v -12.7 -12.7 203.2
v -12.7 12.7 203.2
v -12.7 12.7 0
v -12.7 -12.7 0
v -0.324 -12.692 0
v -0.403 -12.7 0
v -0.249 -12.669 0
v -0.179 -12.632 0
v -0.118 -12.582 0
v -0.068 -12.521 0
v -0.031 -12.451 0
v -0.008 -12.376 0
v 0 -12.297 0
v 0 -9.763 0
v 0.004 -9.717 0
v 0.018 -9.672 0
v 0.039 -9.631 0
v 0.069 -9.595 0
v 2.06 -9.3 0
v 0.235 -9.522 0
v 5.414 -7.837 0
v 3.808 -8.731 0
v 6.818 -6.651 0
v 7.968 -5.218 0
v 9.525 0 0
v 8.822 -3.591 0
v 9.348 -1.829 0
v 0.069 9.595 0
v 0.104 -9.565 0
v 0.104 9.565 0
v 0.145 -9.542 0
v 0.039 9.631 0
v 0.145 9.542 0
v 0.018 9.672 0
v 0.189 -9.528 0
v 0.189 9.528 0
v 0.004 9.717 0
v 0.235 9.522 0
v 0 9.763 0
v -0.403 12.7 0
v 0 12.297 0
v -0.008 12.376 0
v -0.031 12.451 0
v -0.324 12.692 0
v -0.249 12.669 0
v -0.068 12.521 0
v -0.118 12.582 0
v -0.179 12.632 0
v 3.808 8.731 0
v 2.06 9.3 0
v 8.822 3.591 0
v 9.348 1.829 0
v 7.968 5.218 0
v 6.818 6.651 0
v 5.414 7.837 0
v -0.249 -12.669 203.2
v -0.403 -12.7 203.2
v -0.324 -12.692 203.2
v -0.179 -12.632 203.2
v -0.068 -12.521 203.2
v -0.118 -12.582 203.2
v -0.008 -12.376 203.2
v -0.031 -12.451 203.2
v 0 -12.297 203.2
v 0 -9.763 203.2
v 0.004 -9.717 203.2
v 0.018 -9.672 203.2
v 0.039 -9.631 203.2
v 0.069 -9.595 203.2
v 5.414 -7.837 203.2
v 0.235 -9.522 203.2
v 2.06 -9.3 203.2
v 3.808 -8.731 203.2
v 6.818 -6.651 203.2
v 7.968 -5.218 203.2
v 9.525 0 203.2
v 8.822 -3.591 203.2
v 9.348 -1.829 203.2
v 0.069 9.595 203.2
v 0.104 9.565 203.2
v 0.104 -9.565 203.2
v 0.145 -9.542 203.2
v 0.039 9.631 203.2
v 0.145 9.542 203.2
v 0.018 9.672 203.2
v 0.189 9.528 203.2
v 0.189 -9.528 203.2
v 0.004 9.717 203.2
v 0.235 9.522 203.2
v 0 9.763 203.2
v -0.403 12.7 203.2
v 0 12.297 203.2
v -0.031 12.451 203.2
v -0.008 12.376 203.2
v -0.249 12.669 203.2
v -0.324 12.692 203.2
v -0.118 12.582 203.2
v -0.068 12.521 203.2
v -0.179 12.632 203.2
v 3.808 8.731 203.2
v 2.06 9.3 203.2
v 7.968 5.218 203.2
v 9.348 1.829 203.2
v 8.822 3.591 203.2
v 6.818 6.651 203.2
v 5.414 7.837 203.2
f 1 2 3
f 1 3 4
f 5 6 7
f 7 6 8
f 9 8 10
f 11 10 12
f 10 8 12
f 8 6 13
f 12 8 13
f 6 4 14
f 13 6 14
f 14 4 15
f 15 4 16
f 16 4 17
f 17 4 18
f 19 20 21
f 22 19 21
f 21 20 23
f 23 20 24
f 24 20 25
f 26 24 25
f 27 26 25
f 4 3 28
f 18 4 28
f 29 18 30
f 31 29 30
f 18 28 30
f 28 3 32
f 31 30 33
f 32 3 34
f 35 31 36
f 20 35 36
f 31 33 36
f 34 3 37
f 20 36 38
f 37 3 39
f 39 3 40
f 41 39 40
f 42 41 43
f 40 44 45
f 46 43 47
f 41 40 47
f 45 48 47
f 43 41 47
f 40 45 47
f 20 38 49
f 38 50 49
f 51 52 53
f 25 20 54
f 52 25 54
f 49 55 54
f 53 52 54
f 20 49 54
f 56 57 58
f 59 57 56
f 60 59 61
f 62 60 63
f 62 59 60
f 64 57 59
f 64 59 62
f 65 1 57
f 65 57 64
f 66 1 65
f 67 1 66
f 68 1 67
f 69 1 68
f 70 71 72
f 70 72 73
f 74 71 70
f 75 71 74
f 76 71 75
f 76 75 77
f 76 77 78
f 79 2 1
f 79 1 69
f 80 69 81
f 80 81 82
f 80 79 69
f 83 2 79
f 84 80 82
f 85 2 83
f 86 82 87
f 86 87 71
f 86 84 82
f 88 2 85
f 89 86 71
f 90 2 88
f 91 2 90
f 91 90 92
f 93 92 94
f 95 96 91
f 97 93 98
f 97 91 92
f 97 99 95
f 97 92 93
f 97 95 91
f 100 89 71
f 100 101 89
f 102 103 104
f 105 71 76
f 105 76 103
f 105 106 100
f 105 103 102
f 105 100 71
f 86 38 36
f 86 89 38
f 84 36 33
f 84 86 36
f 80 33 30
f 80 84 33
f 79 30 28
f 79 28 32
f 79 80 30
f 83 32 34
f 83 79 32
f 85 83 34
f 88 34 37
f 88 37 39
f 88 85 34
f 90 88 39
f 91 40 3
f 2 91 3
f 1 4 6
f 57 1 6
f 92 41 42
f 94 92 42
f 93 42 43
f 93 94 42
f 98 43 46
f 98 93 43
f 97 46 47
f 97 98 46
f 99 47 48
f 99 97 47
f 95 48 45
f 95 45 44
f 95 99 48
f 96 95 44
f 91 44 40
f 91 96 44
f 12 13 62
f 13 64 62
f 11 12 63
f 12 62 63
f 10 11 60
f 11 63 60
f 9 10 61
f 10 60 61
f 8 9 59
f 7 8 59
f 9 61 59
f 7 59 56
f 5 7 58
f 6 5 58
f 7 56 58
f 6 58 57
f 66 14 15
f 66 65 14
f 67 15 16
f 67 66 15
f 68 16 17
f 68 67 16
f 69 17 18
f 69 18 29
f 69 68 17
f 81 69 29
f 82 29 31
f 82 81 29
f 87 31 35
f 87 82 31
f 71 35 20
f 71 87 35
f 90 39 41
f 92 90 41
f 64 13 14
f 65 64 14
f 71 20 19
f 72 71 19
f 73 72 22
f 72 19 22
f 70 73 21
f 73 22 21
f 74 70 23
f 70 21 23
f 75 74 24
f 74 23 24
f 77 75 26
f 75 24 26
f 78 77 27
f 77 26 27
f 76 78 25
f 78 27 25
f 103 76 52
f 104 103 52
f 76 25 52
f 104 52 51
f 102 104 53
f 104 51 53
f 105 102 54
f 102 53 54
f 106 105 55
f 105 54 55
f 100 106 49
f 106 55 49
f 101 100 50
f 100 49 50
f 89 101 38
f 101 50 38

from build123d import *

# Parameters (mm, degrees)
F1_DEPTH = 203.2
F2_R     = 0.402836
F3_R     = 0.241421


with BuildPart() as f1:
    # F0 (on Top) → F1 (new body)
    with BuildSketch(Plane.XY):
        with BuildLine():
            Line((0, -12.7), (0, -9.525))
            ThreePointArc((0, -9.525), (9.525, 0), (0, 9.525))
            Line((0, 9.525), (0, 12.7))
            Line((0, 12.7), (-12.7, 12.7))
            Line((-12.7, 12.7), (-12.7, -12.7))
            Line((-12.7, -12.7), (0, -12.7))
        make_face()
    extrude(amount=F1_DEPTH)

    # F2
    f2_edges = [f1.edges().sort_by_distance(p)[0] for p in [
        (0, 12.7, 101.6),
        (0, -12.7, 101.6),
    ]]
    fillet(f2_edges, radius=F2_R)

    # F3
    f3_edges = [f1.edges().sort_by_distance(p)[0] for p in [
        (0, 9.525, 101.6),
        (0, -9.525, 101.6),
    ]]
    fillet(f3_edges, radius=F3_R)


solid = f1.part
